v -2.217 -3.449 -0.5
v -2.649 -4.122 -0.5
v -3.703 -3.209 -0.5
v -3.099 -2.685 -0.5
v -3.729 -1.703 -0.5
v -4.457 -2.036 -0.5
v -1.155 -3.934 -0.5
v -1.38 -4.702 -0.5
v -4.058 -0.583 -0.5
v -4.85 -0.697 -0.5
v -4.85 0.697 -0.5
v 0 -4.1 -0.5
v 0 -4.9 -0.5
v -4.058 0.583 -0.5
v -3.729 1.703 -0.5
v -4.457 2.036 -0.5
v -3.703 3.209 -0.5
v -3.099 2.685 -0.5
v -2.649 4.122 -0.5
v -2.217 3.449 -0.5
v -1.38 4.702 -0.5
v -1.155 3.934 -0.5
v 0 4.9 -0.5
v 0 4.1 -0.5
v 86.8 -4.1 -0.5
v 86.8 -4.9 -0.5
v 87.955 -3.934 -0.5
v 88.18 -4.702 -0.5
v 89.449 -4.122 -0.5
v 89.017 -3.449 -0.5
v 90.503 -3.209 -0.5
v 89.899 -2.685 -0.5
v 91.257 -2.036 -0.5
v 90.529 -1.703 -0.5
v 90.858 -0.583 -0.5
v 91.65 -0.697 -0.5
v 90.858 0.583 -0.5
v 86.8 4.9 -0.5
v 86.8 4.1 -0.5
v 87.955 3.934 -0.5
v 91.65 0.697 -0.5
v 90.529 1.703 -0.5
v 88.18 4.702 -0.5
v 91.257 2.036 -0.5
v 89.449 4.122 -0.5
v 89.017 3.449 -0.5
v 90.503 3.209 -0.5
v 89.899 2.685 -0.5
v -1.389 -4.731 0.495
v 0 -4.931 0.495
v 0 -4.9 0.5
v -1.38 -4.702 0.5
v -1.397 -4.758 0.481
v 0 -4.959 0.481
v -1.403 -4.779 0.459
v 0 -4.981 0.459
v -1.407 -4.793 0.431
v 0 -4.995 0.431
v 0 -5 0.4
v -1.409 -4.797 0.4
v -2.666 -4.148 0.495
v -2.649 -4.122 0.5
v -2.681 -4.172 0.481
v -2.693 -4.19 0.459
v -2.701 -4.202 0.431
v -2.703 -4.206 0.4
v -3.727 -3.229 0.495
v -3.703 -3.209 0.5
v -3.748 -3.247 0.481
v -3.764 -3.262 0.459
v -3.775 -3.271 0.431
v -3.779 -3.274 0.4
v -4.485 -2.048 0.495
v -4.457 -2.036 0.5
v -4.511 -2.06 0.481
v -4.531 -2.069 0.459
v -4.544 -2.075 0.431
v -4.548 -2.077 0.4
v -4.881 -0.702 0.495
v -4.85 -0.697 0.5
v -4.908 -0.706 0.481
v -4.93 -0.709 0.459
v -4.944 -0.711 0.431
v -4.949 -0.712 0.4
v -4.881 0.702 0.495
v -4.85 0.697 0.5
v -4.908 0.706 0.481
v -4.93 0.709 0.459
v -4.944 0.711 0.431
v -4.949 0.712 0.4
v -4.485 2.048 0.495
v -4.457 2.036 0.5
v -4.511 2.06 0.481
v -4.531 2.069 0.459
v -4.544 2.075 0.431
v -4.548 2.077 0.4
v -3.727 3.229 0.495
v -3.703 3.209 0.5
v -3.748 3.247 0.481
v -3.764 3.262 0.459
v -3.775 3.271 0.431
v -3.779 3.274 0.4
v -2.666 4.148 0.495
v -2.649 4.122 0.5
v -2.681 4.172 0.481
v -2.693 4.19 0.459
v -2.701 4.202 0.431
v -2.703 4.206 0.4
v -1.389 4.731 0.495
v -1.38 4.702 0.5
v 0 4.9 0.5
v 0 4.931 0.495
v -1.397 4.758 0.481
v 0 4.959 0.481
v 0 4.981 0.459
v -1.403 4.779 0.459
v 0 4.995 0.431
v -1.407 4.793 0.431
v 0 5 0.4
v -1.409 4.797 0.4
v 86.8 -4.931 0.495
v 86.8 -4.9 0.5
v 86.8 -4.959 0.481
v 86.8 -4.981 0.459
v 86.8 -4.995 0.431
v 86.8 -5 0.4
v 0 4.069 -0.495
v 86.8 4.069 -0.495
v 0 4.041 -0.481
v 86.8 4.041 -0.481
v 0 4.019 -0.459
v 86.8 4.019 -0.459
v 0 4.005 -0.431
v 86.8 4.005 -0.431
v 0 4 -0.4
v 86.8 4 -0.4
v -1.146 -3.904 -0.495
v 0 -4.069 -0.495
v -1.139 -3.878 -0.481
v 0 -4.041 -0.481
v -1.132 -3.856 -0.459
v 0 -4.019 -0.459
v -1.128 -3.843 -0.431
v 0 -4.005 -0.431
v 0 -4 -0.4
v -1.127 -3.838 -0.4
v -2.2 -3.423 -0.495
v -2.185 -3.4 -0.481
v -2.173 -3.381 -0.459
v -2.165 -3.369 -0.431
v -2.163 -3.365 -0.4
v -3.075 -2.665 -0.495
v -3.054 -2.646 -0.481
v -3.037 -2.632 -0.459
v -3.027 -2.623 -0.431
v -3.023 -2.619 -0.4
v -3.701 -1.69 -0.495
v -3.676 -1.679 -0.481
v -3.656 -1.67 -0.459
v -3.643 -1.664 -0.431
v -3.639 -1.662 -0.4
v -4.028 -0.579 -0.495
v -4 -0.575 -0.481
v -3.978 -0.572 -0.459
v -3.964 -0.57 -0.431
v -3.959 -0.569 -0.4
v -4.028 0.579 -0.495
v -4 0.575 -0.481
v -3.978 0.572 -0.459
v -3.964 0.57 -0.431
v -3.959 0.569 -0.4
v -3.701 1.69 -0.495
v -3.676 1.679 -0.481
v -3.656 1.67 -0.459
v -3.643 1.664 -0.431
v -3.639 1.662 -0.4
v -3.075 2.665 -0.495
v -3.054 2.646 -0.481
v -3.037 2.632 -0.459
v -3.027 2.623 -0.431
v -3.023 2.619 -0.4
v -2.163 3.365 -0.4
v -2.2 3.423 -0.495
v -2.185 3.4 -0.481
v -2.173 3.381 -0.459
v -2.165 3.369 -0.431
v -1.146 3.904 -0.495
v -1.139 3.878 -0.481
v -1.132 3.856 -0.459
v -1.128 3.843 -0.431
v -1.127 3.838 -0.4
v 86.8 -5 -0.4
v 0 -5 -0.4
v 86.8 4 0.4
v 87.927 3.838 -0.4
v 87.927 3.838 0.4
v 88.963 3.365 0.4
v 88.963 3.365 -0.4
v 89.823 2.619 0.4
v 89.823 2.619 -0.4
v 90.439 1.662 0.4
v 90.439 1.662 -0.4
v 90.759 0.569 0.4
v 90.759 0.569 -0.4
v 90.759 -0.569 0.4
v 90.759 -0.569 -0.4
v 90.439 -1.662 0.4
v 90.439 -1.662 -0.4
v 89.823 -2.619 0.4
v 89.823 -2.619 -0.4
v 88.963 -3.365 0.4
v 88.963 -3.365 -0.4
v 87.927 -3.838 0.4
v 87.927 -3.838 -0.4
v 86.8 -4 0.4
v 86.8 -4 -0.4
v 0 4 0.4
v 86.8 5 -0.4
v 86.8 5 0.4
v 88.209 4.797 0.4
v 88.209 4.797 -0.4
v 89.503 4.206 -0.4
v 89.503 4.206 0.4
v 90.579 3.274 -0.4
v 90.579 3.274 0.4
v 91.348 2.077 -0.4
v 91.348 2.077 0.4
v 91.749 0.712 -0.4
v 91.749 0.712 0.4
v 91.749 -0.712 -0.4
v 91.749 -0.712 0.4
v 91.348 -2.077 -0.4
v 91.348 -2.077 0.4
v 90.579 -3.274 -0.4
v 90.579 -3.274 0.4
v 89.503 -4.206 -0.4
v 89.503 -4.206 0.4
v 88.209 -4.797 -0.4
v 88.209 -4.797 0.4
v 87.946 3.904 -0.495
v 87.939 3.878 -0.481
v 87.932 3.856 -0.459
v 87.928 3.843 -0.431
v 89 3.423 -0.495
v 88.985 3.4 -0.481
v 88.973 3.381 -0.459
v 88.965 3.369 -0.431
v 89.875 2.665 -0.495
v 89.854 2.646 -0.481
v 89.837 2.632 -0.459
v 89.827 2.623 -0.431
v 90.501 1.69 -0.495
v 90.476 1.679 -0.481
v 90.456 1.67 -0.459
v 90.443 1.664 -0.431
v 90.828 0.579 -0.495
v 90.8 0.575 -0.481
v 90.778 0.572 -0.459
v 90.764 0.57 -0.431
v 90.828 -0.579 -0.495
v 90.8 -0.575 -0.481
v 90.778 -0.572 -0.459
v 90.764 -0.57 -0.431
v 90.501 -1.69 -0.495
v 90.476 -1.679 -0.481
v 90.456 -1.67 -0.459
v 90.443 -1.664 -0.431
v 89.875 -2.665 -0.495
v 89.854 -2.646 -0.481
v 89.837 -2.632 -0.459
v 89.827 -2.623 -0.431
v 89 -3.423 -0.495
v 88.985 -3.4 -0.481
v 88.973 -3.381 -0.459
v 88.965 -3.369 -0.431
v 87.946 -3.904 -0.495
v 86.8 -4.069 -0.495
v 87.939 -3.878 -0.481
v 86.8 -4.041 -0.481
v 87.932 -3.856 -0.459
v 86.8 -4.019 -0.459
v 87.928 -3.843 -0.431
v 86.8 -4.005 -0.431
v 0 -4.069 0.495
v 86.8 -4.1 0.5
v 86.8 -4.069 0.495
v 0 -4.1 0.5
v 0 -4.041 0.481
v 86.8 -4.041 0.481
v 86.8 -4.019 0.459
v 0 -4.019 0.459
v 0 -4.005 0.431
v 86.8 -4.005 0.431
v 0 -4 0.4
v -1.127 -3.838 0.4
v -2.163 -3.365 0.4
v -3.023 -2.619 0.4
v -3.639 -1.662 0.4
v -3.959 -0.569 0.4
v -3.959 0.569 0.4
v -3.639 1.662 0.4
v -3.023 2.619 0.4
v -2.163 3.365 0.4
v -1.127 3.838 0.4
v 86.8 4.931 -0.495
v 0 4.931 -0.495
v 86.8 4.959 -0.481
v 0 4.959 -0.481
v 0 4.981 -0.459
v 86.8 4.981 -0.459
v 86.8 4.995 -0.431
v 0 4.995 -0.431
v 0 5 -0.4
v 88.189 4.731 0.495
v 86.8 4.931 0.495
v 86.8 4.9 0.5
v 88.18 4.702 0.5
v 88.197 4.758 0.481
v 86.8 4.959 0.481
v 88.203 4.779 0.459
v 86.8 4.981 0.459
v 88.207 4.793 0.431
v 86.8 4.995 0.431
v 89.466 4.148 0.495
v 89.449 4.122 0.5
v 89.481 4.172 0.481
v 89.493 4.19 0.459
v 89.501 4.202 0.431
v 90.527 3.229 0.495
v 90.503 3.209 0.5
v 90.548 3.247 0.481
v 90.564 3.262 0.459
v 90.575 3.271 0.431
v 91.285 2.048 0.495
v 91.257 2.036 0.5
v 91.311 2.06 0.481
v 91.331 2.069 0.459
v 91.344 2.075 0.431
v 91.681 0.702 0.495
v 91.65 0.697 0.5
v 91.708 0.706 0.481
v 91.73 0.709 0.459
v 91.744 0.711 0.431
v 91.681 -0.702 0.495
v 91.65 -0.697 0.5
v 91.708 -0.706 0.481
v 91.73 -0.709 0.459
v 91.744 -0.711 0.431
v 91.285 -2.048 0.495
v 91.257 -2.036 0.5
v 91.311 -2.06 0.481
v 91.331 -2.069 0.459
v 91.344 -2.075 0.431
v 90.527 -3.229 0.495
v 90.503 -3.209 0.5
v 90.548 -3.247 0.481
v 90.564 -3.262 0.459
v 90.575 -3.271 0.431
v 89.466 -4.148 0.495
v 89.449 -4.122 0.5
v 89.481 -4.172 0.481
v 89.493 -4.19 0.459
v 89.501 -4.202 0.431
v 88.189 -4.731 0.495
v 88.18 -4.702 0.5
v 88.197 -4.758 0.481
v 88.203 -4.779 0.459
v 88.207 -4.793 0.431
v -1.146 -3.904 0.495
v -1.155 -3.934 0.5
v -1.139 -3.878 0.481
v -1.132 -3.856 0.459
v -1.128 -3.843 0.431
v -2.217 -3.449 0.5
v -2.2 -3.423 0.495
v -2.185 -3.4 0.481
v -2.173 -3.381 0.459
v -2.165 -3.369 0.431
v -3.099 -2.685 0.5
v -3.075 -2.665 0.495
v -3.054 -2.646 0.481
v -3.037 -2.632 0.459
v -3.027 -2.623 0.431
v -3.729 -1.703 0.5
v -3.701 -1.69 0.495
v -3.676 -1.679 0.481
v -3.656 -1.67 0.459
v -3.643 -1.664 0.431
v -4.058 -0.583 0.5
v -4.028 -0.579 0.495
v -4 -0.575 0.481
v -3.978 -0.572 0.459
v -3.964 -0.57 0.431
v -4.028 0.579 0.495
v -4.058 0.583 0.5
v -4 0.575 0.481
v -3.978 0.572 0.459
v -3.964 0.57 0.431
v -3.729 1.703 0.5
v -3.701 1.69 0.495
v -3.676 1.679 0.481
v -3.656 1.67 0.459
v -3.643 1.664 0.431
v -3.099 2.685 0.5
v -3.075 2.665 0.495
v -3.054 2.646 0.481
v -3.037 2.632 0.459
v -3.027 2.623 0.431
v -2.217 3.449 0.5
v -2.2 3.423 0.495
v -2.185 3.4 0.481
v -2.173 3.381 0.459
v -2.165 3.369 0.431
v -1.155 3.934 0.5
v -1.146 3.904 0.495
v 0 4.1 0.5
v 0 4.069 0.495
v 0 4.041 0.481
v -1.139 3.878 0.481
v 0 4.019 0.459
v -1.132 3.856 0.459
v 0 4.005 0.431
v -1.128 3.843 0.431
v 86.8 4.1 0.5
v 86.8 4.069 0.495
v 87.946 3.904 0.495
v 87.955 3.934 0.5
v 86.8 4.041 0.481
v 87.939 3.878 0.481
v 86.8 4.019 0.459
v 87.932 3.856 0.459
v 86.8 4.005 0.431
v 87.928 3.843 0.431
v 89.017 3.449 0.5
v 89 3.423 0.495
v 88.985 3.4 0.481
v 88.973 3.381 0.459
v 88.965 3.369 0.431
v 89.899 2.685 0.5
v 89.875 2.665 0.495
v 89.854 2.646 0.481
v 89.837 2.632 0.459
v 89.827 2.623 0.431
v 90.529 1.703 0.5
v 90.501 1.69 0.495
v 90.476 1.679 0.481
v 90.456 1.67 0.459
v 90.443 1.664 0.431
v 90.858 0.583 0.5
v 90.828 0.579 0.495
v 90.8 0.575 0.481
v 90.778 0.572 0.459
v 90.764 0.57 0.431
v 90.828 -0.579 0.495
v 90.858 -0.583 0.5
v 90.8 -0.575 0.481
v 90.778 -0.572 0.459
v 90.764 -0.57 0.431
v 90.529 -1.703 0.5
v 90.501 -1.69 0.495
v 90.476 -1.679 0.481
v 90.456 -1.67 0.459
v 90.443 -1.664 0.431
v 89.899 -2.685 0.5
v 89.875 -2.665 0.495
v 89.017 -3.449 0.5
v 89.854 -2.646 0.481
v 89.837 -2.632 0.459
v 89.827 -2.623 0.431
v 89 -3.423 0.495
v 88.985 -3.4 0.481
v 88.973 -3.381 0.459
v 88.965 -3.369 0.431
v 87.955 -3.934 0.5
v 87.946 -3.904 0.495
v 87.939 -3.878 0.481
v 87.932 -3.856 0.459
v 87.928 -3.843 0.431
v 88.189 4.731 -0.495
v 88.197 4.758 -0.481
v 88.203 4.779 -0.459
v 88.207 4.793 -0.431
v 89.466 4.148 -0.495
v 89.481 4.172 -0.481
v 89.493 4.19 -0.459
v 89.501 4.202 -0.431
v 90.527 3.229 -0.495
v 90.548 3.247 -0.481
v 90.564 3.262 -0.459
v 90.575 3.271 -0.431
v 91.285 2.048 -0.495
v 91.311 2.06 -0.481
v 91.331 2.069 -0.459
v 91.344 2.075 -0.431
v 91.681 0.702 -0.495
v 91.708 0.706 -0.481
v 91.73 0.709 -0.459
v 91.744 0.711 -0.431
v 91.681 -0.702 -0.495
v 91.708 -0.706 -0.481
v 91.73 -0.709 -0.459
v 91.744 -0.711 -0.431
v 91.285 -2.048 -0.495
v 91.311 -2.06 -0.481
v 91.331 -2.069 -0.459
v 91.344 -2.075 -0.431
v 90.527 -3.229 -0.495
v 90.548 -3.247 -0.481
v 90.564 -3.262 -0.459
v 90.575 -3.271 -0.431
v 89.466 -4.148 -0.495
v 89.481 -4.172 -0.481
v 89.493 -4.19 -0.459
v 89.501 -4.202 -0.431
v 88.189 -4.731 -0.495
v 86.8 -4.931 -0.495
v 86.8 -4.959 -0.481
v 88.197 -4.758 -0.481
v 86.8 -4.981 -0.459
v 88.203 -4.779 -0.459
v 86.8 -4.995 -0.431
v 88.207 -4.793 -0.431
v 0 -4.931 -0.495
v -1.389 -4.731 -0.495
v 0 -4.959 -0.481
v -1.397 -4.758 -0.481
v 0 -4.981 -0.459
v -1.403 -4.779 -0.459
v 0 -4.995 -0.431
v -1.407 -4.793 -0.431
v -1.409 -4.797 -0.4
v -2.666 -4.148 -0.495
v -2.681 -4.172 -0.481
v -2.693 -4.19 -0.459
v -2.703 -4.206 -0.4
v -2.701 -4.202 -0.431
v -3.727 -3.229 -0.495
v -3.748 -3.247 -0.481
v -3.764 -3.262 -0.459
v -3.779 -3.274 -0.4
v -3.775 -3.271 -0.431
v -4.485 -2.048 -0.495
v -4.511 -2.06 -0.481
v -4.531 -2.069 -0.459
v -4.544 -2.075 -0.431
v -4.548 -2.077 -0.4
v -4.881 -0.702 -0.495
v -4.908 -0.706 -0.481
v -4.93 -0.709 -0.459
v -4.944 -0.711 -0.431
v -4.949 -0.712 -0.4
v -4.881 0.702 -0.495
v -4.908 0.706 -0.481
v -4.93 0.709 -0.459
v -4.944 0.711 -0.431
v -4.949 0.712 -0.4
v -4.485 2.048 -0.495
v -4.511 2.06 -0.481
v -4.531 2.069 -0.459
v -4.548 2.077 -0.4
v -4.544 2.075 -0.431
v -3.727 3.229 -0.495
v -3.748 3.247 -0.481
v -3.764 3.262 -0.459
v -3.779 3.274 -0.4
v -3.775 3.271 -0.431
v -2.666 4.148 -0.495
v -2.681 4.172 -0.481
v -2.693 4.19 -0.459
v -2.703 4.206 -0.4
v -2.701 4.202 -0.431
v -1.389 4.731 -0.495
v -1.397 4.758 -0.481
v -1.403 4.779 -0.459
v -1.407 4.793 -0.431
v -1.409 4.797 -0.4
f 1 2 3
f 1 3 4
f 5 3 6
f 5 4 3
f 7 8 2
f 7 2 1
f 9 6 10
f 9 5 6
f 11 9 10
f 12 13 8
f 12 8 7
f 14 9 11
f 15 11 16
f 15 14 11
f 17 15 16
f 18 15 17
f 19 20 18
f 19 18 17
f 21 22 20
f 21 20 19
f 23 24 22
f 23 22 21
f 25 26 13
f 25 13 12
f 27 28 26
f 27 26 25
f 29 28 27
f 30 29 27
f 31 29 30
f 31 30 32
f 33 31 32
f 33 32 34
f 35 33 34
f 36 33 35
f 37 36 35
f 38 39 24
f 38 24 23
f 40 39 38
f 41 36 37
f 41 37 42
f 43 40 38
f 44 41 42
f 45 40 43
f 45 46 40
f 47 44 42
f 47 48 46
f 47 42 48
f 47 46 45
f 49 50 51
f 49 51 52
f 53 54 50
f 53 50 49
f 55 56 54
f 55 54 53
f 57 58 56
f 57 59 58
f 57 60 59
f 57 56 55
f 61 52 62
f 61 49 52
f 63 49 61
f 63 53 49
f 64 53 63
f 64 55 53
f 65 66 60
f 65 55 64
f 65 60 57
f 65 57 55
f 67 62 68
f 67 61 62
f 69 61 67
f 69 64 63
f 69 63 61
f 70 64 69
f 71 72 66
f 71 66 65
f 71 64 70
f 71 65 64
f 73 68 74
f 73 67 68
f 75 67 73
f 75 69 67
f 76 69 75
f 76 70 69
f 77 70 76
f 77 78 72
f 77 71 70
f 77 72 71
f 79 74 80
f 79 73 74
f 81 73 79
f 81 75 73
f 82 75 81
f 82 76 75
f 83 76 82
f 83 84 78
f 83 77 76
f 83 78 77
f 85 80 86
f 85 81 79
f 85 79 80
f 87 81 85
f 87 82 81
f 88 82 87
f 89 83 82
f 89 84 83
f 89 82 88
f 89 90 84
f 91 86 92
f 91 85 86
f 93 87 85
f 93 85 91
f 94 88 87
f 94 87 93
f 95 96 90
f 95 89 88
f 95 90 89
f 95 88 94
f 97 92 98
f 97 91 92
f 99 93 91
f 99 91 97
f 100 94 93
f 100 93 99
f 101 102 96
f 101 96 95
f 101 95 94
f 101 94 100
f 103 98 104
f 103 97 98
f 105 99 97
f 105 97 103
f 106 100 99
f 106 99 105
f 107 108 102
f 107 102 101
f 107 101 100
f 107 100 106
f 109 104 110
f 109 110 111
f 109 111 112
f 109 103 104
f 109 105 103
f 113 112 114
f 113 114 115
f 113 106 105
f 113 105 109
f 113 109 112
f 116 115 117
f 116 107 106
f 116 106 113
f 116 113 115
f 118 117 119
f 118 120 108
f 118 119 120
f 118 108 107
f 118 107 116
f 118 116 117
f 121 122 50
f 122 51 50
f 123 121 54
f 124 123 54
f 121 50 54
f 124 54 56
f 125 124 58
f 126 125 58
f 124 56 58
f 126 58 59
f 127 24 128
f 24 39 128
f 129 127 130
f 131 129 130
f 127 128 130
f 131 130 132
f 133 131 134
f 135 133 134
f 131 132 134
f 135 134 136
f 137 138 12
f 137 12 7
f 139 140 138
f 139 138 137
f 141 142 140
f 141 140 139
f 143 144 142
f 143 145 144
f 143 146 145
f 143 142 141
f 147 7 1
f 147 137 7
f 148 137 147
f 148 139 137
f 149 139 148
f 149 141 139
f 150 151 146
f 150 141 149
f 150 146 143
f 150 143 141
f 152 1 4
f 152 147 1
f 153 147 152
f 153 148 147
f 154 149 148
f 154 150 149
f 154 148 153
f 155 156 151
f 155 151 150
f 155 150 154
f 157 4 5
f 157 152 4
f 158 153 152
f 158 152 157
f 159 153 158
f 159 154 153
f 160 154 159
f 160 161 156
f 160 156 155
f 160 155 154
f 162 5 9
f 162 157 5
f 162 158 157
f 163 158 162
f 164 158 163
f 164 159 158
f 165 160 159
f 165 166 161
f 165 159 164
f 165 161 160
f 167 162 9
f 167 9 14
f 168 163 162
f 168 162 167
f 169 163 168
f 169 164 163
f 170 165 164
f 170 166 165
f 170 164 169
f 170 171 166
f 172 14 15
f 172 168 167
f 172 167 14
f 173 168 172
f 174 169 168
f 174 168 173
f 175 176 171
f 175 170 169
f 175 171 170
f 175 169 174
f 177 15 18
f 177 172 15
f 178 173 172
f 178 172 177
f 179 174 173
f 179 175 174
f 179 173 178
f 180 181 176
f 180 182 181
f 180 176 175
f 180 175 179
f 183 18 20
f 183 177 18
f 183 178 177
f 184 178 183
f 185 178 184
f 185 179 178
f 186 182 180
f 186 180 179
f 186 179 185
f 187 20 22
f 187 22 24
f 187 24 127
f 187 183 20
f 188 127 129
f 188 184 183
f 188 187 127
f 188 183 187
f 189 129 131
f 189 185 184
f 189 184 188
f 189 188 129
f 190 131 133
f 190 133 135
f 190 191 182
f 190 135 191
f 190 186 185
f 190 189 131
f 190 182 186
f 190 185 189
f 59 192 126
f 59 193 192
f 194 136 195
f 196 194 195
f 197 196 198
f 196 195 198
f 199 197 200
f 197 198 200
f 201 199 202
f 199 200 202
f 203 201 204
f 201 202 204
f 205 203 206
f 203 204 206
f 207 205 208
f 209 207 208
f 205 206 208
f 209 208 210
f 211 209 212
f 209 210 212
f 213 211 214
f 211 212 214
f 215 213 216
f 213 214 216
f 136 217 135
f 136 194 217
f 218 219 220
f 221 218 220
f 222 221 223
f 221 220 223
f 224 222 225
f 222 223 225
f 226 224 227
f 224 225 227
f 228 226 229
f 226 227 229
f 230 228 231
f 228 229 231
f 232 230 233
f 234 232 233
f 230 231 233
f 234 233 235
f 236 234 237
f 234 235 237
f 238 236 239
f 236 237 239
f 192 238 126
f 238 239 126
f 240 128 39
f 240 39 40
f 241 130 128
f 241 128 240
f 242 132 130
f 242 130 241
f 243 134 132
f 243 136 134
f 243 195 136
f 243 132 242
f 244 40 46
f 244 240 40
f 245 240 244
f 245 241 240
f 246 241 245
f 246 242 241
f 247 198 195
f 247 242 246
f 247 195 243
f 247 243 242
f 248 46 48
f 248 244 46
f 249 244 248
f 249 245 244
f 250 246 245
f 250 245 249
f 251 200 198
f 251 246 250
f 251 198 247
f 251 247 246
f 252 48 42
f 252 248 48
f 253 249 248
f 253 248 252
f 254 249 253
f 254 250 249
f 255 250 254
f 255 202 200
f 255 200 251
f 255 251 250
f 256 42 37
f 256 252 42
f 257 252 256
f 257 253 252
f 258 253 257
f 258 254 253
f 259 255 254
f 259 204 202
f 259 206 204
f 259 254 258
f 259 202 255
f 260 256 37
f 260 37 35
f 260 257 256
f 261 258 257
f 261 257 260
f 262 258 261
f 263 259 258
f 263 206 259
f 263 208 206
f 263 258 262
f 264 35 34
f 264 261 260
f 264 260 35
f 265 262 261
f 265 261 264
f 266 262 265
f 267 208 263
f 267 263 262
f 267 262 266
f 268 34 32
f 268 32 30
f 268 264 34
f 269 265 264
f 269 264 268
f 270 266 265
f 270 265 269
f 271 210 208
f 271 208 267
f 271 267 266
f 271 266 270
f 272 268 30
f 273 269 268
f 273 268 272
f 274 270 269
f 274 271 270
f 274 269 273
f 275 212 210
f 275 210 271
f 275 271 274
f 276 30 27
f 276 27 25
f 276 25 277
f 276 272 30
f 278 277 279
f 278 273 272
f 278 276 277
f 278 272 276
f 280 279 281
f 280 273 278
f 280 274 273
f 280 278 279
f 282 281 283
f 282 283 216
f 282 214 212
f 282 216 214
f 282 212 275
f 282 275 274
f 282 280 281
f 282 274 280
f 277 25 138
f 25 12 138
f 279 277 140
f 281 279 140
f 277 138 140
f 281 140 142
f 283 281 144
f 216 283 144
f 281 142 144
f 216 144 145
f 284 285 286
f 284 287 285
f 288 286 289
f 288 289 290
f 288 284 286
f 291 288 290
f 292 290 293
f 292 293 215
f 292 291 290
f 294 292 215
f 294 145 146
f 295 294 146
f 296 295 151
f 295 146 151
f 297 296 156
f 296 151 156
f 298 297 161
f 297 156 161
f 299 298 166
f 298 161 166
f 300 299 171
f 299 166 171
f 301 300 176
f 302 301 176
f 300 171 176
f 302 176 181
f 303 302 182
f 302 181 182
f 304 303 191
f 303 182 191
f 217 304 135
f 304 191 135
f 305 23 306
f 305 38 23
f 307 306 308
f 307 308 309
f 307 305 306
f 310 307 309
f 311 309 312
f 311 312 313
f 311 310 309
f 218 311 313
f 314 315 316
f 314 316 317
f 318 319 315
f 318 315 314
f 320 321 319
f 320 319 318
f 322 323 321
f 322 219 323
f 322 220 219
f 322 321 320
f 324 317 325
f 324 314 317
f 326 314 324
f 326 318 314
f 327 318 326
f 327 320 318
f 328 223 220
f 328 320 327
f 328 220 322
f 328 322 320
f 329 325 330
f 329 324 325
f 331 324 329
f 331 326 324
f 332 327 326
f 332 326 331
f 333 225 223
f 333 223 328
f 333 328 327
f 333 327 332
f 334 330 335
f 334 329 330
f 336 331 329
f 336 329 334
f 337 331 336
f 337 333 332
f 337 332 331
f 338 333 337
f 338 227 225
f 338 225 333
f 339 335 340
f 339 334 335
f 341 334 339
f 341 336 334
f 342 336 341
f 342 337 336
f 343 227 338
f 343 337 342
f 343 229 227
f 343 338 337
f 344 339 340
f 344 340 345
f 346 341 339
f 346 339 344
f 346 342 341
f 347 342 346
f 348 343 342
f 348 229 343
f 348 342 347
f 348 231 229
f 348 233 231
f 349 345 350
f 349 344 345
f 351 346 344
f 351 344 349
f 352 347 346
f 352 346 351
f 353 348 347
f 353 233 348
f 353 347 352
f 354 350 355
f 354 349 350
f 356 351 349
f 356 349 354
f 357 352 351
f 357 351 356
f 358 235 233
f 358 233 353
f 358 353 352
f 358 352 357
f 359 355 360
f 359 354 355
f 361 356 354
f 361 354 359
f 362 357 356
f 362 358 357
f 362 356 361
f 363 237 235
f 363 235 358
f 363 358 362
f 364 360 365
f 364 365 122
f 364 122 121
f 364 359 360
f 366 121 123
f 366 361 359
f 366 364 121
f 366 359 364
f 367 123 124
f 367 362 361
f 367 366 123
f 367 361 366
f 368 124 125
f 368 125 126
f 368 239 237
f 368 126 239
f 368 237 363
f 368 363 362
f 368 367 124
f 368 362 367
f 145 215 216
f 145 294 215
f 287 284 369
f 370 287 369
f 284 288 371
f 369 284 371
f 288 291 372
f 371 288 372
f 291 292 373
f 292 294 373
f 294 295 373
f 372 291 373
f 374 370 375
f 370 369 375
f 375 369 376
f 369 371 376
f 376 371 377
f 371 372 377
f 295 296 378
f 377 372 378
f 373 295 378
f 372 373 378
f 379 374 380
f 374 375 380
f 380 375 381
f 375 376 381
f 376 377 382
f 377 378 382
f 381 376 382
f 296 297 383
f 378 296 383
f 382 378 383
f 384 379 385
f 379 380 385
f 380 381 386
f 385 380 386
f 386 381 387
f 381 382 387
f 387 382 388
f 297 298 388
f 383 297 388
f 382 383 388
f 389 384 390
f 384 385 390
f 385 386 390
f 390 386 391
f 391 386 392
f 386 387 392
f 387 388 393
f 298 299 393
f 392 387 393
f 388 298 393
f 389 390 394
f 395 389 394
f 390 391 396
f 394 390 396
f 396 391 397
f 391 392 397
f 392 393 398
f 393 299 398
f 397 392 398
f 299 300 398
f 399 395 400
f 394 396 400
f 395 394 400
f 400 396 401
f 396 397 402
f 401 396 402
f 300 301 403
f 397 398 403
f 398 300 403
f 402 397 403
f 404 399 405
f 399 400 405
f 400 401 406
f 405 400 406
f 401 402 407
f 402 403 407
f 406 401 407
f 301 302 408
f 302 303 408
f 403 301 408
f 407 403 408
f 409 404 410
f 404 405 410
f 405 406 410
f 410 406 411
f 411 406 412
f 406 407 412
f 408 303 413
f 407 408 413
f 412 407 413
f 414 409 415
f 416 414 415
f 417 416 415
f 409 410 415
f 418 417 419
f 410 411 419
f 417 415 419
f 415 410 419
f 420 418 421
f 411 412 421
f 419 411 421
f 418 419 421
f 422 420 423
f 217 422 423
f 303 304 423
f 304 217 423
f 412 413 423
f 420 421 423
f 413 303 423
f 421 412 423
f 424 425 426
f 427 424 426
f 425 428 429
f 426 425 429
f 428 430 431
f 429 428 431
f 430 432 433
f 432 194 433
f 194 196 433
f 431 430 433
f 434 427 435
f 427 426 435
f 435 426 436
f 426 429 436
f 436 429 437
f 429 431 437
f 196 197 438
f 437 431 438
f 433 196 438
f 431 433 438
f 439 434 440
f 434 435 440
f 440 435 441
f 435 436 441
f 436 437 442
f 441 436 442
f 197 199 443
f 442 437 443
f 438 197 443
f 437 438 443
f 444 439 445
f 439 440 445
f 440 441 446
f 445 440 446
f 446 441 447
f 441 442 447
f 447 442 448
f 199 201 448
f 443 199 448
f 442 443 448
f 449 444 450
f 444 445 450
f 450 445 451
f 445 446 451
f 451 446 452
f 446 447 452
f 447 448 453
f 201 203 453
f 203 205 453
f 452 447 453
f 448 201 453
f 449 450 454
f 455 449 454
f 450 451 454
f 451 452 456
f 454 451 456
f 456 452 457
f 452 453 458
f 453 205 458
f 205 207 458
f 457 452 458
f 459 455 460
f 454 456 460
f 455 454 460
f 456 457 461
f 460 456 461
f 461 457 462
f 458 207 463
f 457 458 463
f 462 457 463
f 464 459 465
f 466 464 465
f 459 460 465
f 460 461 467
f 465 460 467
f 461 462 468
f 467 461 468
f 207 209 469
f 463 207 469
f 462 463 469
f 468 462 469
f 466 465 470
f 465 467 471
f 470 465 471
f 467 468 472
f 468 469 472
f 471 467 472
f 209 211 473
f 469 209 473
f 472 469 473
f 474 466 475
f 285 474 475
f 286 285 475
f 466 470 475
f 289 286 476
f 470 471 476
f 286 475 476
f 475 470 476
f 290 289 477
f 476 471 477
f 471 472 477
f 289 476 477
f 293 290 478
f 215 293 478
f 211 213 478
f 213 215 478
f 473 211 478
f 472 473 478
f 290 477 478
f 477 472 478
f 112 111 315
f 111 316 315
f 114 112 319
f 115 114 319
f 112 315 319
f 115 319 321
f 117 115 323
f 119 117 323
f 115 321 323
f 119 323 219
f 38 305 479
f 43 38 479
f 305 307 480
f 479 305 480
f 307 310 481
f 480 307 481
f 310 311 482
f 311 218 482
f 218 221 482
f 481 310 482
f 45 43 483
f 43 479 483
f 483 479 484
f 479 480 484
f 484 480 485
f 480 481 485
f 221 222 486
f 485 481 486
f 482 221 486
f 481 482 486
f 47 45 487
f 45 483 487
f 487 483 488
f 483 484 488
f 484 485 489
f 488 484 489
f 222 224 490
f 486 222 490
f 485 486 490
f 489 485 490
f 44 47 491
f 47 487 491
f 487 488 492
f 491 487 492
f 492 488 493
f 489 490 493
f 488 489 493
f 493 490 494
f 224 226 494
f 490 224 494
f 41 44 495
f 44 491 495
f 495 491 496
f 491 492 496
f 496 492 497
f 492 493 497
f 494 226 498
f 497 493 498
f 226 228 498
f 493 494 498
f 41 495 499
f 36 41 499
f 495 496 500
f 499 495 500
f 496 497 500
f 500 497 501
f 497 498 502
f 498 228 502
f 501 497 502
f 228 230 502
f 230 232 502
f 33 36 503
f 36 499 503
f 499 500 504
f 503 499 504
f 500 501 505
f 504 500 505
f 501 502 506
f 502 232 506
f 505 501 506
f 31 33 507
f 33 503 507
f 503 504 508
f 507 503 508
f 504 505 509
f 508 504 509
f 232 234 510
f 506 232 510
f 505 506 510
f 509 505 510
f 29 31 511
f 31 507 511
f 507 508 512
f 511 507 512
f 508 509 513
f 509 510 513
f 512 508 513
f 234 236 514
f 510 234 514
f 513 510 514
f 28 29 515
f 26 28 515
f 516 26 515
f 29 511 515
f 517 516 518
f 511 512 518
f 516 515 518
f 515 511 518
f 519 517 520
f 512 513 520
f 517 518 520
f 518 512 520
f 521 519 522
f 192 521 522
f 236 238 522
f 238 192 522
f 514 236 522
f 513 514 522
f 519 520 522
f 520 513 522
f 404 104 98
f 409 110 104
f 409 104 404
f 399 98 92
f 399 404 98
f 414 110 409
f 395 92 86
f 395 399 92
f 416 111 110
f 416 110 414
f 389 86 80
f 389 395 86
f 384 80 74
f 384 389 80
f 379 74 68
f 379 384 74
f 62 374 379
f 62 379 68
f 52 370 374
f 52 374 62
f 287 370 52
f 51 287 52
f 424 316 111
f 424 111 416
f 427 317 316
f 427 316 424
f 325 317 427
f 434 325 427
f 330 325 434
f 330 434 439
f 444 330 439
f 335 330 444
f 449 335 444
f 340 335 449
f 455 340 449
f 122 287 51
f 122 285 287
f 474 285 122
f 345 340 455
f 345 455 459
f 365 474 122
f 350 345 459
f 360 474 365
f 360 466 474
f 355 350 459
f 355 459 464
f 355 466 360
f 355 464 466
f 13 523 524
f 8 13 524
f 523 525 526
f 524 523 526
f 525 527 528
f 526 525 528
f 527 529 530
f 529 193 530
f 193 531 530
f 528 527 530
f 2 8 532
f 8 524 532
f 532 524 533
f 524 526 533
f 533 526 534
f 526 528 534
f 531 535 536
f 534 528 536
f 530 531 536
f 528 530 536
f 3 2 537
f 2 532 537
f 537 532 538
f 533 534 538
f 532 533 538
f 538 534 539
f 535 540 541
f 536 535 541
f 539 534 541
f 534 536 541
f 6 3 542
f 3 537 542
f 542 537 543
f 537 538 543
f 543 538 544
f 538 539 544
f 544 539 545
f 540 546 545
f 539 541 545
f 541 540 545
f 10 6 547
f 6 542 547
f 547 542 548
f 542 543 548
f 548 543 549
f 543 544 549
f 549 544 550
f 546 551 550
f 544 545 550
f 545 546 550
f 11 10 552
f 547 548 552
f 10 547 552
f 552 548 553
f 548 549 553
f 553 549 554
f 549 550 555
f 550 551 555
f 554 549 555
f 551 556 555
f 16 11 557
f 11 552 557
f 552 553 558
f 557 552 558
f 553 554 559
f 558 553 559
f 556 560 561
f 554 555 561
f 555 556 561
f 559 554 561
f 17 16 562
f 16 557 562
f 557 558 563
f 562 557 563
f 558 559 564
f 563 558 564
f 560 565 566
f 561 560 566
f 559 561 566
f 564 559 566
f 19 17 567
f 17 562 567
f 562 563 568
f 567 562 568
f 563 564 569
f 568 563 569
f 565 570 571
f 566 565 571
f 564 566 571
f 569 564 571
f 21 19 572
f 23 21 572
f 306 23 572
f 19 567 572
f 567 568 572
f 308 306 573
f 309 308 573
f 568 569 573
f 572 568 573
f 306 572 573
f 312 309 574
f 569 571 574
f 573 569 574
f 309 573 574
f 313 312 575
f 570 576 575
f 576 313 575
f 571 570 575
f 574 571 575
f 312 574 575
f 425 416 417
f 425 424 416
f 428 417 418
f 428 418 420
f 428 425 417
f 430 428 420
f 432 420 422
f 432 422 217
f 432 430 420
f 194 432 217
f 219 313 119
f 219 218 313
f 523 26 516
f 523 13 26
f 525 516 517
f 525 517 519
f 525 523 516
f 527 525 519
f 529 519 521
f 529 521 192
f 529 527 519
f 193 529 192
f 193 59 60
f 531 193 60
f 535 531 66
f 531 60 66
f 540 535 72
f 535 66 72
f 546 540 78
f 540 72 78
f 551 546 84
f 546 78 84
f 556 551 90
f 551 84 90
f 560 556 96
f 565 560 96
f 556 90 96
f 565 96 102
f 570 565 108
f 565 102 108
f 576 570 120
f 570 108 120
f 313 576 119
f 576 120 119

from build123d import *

# Parameters (mm, degrees)
SKETCH3_W    = 1
SKETCH3_H    = 1
SOFT_EDGES_R = 0.1


with BuildPart() as part:
    # rubber_band: sweep along a path in Sketch2
    with BuildLine(Plane.XY) as rubber_band_path:
        Line((0, 4.5), (86.8, 4.5))
        ThreePointArc((86.8, 4.5), (91.3, 0), (86.8, -4.5))
        Line((86.8, -4.5), (0, -4.5))
        ThreePointArc((0, -4.5), (-4.5, 0), (0, 4.5))
    # Sketch3 → rubber_band (sweep)
    with BuildSketch(Plane(origin=(0, 0, 0), x_dir=(0, 0, -1), z_dir=(1, 0, 0))):
        with Locations((0, 4.5)):
            Rectangle(SKETCH3_W, SKETCH3_H)
    sweep(path=rubber_band_path.line)

    # soft_edges
    soft_edges_edges = [part.edges().sort_by_distance(p)[0] for p in [
        (-5, 0, 0.5),
        (-4, 0, 0.5),
        (-4, 0, -0.5),
        (-5, 0, -0.5),
        (43.4, -5, 0.5),
        (43.4, -4, 0.5),
        (43.4, -4, -0.5),
        (43.4, -5, -0.5),
        (91.8, 0, 0.5),
        (90.8, 0, 0.5),
        (90.8, 0, -0.5),
        (91.8, 0, -0.5),
        (43.4, 5, 0.5),
        (43.4, 4, 0.5),
        (43.4, 4, -0.5),
        (43.4, 5, -0.5),
    ]]
    fillet(soft_edges_edges, radius=SOFT_EDGES_R)


solid = part.part
